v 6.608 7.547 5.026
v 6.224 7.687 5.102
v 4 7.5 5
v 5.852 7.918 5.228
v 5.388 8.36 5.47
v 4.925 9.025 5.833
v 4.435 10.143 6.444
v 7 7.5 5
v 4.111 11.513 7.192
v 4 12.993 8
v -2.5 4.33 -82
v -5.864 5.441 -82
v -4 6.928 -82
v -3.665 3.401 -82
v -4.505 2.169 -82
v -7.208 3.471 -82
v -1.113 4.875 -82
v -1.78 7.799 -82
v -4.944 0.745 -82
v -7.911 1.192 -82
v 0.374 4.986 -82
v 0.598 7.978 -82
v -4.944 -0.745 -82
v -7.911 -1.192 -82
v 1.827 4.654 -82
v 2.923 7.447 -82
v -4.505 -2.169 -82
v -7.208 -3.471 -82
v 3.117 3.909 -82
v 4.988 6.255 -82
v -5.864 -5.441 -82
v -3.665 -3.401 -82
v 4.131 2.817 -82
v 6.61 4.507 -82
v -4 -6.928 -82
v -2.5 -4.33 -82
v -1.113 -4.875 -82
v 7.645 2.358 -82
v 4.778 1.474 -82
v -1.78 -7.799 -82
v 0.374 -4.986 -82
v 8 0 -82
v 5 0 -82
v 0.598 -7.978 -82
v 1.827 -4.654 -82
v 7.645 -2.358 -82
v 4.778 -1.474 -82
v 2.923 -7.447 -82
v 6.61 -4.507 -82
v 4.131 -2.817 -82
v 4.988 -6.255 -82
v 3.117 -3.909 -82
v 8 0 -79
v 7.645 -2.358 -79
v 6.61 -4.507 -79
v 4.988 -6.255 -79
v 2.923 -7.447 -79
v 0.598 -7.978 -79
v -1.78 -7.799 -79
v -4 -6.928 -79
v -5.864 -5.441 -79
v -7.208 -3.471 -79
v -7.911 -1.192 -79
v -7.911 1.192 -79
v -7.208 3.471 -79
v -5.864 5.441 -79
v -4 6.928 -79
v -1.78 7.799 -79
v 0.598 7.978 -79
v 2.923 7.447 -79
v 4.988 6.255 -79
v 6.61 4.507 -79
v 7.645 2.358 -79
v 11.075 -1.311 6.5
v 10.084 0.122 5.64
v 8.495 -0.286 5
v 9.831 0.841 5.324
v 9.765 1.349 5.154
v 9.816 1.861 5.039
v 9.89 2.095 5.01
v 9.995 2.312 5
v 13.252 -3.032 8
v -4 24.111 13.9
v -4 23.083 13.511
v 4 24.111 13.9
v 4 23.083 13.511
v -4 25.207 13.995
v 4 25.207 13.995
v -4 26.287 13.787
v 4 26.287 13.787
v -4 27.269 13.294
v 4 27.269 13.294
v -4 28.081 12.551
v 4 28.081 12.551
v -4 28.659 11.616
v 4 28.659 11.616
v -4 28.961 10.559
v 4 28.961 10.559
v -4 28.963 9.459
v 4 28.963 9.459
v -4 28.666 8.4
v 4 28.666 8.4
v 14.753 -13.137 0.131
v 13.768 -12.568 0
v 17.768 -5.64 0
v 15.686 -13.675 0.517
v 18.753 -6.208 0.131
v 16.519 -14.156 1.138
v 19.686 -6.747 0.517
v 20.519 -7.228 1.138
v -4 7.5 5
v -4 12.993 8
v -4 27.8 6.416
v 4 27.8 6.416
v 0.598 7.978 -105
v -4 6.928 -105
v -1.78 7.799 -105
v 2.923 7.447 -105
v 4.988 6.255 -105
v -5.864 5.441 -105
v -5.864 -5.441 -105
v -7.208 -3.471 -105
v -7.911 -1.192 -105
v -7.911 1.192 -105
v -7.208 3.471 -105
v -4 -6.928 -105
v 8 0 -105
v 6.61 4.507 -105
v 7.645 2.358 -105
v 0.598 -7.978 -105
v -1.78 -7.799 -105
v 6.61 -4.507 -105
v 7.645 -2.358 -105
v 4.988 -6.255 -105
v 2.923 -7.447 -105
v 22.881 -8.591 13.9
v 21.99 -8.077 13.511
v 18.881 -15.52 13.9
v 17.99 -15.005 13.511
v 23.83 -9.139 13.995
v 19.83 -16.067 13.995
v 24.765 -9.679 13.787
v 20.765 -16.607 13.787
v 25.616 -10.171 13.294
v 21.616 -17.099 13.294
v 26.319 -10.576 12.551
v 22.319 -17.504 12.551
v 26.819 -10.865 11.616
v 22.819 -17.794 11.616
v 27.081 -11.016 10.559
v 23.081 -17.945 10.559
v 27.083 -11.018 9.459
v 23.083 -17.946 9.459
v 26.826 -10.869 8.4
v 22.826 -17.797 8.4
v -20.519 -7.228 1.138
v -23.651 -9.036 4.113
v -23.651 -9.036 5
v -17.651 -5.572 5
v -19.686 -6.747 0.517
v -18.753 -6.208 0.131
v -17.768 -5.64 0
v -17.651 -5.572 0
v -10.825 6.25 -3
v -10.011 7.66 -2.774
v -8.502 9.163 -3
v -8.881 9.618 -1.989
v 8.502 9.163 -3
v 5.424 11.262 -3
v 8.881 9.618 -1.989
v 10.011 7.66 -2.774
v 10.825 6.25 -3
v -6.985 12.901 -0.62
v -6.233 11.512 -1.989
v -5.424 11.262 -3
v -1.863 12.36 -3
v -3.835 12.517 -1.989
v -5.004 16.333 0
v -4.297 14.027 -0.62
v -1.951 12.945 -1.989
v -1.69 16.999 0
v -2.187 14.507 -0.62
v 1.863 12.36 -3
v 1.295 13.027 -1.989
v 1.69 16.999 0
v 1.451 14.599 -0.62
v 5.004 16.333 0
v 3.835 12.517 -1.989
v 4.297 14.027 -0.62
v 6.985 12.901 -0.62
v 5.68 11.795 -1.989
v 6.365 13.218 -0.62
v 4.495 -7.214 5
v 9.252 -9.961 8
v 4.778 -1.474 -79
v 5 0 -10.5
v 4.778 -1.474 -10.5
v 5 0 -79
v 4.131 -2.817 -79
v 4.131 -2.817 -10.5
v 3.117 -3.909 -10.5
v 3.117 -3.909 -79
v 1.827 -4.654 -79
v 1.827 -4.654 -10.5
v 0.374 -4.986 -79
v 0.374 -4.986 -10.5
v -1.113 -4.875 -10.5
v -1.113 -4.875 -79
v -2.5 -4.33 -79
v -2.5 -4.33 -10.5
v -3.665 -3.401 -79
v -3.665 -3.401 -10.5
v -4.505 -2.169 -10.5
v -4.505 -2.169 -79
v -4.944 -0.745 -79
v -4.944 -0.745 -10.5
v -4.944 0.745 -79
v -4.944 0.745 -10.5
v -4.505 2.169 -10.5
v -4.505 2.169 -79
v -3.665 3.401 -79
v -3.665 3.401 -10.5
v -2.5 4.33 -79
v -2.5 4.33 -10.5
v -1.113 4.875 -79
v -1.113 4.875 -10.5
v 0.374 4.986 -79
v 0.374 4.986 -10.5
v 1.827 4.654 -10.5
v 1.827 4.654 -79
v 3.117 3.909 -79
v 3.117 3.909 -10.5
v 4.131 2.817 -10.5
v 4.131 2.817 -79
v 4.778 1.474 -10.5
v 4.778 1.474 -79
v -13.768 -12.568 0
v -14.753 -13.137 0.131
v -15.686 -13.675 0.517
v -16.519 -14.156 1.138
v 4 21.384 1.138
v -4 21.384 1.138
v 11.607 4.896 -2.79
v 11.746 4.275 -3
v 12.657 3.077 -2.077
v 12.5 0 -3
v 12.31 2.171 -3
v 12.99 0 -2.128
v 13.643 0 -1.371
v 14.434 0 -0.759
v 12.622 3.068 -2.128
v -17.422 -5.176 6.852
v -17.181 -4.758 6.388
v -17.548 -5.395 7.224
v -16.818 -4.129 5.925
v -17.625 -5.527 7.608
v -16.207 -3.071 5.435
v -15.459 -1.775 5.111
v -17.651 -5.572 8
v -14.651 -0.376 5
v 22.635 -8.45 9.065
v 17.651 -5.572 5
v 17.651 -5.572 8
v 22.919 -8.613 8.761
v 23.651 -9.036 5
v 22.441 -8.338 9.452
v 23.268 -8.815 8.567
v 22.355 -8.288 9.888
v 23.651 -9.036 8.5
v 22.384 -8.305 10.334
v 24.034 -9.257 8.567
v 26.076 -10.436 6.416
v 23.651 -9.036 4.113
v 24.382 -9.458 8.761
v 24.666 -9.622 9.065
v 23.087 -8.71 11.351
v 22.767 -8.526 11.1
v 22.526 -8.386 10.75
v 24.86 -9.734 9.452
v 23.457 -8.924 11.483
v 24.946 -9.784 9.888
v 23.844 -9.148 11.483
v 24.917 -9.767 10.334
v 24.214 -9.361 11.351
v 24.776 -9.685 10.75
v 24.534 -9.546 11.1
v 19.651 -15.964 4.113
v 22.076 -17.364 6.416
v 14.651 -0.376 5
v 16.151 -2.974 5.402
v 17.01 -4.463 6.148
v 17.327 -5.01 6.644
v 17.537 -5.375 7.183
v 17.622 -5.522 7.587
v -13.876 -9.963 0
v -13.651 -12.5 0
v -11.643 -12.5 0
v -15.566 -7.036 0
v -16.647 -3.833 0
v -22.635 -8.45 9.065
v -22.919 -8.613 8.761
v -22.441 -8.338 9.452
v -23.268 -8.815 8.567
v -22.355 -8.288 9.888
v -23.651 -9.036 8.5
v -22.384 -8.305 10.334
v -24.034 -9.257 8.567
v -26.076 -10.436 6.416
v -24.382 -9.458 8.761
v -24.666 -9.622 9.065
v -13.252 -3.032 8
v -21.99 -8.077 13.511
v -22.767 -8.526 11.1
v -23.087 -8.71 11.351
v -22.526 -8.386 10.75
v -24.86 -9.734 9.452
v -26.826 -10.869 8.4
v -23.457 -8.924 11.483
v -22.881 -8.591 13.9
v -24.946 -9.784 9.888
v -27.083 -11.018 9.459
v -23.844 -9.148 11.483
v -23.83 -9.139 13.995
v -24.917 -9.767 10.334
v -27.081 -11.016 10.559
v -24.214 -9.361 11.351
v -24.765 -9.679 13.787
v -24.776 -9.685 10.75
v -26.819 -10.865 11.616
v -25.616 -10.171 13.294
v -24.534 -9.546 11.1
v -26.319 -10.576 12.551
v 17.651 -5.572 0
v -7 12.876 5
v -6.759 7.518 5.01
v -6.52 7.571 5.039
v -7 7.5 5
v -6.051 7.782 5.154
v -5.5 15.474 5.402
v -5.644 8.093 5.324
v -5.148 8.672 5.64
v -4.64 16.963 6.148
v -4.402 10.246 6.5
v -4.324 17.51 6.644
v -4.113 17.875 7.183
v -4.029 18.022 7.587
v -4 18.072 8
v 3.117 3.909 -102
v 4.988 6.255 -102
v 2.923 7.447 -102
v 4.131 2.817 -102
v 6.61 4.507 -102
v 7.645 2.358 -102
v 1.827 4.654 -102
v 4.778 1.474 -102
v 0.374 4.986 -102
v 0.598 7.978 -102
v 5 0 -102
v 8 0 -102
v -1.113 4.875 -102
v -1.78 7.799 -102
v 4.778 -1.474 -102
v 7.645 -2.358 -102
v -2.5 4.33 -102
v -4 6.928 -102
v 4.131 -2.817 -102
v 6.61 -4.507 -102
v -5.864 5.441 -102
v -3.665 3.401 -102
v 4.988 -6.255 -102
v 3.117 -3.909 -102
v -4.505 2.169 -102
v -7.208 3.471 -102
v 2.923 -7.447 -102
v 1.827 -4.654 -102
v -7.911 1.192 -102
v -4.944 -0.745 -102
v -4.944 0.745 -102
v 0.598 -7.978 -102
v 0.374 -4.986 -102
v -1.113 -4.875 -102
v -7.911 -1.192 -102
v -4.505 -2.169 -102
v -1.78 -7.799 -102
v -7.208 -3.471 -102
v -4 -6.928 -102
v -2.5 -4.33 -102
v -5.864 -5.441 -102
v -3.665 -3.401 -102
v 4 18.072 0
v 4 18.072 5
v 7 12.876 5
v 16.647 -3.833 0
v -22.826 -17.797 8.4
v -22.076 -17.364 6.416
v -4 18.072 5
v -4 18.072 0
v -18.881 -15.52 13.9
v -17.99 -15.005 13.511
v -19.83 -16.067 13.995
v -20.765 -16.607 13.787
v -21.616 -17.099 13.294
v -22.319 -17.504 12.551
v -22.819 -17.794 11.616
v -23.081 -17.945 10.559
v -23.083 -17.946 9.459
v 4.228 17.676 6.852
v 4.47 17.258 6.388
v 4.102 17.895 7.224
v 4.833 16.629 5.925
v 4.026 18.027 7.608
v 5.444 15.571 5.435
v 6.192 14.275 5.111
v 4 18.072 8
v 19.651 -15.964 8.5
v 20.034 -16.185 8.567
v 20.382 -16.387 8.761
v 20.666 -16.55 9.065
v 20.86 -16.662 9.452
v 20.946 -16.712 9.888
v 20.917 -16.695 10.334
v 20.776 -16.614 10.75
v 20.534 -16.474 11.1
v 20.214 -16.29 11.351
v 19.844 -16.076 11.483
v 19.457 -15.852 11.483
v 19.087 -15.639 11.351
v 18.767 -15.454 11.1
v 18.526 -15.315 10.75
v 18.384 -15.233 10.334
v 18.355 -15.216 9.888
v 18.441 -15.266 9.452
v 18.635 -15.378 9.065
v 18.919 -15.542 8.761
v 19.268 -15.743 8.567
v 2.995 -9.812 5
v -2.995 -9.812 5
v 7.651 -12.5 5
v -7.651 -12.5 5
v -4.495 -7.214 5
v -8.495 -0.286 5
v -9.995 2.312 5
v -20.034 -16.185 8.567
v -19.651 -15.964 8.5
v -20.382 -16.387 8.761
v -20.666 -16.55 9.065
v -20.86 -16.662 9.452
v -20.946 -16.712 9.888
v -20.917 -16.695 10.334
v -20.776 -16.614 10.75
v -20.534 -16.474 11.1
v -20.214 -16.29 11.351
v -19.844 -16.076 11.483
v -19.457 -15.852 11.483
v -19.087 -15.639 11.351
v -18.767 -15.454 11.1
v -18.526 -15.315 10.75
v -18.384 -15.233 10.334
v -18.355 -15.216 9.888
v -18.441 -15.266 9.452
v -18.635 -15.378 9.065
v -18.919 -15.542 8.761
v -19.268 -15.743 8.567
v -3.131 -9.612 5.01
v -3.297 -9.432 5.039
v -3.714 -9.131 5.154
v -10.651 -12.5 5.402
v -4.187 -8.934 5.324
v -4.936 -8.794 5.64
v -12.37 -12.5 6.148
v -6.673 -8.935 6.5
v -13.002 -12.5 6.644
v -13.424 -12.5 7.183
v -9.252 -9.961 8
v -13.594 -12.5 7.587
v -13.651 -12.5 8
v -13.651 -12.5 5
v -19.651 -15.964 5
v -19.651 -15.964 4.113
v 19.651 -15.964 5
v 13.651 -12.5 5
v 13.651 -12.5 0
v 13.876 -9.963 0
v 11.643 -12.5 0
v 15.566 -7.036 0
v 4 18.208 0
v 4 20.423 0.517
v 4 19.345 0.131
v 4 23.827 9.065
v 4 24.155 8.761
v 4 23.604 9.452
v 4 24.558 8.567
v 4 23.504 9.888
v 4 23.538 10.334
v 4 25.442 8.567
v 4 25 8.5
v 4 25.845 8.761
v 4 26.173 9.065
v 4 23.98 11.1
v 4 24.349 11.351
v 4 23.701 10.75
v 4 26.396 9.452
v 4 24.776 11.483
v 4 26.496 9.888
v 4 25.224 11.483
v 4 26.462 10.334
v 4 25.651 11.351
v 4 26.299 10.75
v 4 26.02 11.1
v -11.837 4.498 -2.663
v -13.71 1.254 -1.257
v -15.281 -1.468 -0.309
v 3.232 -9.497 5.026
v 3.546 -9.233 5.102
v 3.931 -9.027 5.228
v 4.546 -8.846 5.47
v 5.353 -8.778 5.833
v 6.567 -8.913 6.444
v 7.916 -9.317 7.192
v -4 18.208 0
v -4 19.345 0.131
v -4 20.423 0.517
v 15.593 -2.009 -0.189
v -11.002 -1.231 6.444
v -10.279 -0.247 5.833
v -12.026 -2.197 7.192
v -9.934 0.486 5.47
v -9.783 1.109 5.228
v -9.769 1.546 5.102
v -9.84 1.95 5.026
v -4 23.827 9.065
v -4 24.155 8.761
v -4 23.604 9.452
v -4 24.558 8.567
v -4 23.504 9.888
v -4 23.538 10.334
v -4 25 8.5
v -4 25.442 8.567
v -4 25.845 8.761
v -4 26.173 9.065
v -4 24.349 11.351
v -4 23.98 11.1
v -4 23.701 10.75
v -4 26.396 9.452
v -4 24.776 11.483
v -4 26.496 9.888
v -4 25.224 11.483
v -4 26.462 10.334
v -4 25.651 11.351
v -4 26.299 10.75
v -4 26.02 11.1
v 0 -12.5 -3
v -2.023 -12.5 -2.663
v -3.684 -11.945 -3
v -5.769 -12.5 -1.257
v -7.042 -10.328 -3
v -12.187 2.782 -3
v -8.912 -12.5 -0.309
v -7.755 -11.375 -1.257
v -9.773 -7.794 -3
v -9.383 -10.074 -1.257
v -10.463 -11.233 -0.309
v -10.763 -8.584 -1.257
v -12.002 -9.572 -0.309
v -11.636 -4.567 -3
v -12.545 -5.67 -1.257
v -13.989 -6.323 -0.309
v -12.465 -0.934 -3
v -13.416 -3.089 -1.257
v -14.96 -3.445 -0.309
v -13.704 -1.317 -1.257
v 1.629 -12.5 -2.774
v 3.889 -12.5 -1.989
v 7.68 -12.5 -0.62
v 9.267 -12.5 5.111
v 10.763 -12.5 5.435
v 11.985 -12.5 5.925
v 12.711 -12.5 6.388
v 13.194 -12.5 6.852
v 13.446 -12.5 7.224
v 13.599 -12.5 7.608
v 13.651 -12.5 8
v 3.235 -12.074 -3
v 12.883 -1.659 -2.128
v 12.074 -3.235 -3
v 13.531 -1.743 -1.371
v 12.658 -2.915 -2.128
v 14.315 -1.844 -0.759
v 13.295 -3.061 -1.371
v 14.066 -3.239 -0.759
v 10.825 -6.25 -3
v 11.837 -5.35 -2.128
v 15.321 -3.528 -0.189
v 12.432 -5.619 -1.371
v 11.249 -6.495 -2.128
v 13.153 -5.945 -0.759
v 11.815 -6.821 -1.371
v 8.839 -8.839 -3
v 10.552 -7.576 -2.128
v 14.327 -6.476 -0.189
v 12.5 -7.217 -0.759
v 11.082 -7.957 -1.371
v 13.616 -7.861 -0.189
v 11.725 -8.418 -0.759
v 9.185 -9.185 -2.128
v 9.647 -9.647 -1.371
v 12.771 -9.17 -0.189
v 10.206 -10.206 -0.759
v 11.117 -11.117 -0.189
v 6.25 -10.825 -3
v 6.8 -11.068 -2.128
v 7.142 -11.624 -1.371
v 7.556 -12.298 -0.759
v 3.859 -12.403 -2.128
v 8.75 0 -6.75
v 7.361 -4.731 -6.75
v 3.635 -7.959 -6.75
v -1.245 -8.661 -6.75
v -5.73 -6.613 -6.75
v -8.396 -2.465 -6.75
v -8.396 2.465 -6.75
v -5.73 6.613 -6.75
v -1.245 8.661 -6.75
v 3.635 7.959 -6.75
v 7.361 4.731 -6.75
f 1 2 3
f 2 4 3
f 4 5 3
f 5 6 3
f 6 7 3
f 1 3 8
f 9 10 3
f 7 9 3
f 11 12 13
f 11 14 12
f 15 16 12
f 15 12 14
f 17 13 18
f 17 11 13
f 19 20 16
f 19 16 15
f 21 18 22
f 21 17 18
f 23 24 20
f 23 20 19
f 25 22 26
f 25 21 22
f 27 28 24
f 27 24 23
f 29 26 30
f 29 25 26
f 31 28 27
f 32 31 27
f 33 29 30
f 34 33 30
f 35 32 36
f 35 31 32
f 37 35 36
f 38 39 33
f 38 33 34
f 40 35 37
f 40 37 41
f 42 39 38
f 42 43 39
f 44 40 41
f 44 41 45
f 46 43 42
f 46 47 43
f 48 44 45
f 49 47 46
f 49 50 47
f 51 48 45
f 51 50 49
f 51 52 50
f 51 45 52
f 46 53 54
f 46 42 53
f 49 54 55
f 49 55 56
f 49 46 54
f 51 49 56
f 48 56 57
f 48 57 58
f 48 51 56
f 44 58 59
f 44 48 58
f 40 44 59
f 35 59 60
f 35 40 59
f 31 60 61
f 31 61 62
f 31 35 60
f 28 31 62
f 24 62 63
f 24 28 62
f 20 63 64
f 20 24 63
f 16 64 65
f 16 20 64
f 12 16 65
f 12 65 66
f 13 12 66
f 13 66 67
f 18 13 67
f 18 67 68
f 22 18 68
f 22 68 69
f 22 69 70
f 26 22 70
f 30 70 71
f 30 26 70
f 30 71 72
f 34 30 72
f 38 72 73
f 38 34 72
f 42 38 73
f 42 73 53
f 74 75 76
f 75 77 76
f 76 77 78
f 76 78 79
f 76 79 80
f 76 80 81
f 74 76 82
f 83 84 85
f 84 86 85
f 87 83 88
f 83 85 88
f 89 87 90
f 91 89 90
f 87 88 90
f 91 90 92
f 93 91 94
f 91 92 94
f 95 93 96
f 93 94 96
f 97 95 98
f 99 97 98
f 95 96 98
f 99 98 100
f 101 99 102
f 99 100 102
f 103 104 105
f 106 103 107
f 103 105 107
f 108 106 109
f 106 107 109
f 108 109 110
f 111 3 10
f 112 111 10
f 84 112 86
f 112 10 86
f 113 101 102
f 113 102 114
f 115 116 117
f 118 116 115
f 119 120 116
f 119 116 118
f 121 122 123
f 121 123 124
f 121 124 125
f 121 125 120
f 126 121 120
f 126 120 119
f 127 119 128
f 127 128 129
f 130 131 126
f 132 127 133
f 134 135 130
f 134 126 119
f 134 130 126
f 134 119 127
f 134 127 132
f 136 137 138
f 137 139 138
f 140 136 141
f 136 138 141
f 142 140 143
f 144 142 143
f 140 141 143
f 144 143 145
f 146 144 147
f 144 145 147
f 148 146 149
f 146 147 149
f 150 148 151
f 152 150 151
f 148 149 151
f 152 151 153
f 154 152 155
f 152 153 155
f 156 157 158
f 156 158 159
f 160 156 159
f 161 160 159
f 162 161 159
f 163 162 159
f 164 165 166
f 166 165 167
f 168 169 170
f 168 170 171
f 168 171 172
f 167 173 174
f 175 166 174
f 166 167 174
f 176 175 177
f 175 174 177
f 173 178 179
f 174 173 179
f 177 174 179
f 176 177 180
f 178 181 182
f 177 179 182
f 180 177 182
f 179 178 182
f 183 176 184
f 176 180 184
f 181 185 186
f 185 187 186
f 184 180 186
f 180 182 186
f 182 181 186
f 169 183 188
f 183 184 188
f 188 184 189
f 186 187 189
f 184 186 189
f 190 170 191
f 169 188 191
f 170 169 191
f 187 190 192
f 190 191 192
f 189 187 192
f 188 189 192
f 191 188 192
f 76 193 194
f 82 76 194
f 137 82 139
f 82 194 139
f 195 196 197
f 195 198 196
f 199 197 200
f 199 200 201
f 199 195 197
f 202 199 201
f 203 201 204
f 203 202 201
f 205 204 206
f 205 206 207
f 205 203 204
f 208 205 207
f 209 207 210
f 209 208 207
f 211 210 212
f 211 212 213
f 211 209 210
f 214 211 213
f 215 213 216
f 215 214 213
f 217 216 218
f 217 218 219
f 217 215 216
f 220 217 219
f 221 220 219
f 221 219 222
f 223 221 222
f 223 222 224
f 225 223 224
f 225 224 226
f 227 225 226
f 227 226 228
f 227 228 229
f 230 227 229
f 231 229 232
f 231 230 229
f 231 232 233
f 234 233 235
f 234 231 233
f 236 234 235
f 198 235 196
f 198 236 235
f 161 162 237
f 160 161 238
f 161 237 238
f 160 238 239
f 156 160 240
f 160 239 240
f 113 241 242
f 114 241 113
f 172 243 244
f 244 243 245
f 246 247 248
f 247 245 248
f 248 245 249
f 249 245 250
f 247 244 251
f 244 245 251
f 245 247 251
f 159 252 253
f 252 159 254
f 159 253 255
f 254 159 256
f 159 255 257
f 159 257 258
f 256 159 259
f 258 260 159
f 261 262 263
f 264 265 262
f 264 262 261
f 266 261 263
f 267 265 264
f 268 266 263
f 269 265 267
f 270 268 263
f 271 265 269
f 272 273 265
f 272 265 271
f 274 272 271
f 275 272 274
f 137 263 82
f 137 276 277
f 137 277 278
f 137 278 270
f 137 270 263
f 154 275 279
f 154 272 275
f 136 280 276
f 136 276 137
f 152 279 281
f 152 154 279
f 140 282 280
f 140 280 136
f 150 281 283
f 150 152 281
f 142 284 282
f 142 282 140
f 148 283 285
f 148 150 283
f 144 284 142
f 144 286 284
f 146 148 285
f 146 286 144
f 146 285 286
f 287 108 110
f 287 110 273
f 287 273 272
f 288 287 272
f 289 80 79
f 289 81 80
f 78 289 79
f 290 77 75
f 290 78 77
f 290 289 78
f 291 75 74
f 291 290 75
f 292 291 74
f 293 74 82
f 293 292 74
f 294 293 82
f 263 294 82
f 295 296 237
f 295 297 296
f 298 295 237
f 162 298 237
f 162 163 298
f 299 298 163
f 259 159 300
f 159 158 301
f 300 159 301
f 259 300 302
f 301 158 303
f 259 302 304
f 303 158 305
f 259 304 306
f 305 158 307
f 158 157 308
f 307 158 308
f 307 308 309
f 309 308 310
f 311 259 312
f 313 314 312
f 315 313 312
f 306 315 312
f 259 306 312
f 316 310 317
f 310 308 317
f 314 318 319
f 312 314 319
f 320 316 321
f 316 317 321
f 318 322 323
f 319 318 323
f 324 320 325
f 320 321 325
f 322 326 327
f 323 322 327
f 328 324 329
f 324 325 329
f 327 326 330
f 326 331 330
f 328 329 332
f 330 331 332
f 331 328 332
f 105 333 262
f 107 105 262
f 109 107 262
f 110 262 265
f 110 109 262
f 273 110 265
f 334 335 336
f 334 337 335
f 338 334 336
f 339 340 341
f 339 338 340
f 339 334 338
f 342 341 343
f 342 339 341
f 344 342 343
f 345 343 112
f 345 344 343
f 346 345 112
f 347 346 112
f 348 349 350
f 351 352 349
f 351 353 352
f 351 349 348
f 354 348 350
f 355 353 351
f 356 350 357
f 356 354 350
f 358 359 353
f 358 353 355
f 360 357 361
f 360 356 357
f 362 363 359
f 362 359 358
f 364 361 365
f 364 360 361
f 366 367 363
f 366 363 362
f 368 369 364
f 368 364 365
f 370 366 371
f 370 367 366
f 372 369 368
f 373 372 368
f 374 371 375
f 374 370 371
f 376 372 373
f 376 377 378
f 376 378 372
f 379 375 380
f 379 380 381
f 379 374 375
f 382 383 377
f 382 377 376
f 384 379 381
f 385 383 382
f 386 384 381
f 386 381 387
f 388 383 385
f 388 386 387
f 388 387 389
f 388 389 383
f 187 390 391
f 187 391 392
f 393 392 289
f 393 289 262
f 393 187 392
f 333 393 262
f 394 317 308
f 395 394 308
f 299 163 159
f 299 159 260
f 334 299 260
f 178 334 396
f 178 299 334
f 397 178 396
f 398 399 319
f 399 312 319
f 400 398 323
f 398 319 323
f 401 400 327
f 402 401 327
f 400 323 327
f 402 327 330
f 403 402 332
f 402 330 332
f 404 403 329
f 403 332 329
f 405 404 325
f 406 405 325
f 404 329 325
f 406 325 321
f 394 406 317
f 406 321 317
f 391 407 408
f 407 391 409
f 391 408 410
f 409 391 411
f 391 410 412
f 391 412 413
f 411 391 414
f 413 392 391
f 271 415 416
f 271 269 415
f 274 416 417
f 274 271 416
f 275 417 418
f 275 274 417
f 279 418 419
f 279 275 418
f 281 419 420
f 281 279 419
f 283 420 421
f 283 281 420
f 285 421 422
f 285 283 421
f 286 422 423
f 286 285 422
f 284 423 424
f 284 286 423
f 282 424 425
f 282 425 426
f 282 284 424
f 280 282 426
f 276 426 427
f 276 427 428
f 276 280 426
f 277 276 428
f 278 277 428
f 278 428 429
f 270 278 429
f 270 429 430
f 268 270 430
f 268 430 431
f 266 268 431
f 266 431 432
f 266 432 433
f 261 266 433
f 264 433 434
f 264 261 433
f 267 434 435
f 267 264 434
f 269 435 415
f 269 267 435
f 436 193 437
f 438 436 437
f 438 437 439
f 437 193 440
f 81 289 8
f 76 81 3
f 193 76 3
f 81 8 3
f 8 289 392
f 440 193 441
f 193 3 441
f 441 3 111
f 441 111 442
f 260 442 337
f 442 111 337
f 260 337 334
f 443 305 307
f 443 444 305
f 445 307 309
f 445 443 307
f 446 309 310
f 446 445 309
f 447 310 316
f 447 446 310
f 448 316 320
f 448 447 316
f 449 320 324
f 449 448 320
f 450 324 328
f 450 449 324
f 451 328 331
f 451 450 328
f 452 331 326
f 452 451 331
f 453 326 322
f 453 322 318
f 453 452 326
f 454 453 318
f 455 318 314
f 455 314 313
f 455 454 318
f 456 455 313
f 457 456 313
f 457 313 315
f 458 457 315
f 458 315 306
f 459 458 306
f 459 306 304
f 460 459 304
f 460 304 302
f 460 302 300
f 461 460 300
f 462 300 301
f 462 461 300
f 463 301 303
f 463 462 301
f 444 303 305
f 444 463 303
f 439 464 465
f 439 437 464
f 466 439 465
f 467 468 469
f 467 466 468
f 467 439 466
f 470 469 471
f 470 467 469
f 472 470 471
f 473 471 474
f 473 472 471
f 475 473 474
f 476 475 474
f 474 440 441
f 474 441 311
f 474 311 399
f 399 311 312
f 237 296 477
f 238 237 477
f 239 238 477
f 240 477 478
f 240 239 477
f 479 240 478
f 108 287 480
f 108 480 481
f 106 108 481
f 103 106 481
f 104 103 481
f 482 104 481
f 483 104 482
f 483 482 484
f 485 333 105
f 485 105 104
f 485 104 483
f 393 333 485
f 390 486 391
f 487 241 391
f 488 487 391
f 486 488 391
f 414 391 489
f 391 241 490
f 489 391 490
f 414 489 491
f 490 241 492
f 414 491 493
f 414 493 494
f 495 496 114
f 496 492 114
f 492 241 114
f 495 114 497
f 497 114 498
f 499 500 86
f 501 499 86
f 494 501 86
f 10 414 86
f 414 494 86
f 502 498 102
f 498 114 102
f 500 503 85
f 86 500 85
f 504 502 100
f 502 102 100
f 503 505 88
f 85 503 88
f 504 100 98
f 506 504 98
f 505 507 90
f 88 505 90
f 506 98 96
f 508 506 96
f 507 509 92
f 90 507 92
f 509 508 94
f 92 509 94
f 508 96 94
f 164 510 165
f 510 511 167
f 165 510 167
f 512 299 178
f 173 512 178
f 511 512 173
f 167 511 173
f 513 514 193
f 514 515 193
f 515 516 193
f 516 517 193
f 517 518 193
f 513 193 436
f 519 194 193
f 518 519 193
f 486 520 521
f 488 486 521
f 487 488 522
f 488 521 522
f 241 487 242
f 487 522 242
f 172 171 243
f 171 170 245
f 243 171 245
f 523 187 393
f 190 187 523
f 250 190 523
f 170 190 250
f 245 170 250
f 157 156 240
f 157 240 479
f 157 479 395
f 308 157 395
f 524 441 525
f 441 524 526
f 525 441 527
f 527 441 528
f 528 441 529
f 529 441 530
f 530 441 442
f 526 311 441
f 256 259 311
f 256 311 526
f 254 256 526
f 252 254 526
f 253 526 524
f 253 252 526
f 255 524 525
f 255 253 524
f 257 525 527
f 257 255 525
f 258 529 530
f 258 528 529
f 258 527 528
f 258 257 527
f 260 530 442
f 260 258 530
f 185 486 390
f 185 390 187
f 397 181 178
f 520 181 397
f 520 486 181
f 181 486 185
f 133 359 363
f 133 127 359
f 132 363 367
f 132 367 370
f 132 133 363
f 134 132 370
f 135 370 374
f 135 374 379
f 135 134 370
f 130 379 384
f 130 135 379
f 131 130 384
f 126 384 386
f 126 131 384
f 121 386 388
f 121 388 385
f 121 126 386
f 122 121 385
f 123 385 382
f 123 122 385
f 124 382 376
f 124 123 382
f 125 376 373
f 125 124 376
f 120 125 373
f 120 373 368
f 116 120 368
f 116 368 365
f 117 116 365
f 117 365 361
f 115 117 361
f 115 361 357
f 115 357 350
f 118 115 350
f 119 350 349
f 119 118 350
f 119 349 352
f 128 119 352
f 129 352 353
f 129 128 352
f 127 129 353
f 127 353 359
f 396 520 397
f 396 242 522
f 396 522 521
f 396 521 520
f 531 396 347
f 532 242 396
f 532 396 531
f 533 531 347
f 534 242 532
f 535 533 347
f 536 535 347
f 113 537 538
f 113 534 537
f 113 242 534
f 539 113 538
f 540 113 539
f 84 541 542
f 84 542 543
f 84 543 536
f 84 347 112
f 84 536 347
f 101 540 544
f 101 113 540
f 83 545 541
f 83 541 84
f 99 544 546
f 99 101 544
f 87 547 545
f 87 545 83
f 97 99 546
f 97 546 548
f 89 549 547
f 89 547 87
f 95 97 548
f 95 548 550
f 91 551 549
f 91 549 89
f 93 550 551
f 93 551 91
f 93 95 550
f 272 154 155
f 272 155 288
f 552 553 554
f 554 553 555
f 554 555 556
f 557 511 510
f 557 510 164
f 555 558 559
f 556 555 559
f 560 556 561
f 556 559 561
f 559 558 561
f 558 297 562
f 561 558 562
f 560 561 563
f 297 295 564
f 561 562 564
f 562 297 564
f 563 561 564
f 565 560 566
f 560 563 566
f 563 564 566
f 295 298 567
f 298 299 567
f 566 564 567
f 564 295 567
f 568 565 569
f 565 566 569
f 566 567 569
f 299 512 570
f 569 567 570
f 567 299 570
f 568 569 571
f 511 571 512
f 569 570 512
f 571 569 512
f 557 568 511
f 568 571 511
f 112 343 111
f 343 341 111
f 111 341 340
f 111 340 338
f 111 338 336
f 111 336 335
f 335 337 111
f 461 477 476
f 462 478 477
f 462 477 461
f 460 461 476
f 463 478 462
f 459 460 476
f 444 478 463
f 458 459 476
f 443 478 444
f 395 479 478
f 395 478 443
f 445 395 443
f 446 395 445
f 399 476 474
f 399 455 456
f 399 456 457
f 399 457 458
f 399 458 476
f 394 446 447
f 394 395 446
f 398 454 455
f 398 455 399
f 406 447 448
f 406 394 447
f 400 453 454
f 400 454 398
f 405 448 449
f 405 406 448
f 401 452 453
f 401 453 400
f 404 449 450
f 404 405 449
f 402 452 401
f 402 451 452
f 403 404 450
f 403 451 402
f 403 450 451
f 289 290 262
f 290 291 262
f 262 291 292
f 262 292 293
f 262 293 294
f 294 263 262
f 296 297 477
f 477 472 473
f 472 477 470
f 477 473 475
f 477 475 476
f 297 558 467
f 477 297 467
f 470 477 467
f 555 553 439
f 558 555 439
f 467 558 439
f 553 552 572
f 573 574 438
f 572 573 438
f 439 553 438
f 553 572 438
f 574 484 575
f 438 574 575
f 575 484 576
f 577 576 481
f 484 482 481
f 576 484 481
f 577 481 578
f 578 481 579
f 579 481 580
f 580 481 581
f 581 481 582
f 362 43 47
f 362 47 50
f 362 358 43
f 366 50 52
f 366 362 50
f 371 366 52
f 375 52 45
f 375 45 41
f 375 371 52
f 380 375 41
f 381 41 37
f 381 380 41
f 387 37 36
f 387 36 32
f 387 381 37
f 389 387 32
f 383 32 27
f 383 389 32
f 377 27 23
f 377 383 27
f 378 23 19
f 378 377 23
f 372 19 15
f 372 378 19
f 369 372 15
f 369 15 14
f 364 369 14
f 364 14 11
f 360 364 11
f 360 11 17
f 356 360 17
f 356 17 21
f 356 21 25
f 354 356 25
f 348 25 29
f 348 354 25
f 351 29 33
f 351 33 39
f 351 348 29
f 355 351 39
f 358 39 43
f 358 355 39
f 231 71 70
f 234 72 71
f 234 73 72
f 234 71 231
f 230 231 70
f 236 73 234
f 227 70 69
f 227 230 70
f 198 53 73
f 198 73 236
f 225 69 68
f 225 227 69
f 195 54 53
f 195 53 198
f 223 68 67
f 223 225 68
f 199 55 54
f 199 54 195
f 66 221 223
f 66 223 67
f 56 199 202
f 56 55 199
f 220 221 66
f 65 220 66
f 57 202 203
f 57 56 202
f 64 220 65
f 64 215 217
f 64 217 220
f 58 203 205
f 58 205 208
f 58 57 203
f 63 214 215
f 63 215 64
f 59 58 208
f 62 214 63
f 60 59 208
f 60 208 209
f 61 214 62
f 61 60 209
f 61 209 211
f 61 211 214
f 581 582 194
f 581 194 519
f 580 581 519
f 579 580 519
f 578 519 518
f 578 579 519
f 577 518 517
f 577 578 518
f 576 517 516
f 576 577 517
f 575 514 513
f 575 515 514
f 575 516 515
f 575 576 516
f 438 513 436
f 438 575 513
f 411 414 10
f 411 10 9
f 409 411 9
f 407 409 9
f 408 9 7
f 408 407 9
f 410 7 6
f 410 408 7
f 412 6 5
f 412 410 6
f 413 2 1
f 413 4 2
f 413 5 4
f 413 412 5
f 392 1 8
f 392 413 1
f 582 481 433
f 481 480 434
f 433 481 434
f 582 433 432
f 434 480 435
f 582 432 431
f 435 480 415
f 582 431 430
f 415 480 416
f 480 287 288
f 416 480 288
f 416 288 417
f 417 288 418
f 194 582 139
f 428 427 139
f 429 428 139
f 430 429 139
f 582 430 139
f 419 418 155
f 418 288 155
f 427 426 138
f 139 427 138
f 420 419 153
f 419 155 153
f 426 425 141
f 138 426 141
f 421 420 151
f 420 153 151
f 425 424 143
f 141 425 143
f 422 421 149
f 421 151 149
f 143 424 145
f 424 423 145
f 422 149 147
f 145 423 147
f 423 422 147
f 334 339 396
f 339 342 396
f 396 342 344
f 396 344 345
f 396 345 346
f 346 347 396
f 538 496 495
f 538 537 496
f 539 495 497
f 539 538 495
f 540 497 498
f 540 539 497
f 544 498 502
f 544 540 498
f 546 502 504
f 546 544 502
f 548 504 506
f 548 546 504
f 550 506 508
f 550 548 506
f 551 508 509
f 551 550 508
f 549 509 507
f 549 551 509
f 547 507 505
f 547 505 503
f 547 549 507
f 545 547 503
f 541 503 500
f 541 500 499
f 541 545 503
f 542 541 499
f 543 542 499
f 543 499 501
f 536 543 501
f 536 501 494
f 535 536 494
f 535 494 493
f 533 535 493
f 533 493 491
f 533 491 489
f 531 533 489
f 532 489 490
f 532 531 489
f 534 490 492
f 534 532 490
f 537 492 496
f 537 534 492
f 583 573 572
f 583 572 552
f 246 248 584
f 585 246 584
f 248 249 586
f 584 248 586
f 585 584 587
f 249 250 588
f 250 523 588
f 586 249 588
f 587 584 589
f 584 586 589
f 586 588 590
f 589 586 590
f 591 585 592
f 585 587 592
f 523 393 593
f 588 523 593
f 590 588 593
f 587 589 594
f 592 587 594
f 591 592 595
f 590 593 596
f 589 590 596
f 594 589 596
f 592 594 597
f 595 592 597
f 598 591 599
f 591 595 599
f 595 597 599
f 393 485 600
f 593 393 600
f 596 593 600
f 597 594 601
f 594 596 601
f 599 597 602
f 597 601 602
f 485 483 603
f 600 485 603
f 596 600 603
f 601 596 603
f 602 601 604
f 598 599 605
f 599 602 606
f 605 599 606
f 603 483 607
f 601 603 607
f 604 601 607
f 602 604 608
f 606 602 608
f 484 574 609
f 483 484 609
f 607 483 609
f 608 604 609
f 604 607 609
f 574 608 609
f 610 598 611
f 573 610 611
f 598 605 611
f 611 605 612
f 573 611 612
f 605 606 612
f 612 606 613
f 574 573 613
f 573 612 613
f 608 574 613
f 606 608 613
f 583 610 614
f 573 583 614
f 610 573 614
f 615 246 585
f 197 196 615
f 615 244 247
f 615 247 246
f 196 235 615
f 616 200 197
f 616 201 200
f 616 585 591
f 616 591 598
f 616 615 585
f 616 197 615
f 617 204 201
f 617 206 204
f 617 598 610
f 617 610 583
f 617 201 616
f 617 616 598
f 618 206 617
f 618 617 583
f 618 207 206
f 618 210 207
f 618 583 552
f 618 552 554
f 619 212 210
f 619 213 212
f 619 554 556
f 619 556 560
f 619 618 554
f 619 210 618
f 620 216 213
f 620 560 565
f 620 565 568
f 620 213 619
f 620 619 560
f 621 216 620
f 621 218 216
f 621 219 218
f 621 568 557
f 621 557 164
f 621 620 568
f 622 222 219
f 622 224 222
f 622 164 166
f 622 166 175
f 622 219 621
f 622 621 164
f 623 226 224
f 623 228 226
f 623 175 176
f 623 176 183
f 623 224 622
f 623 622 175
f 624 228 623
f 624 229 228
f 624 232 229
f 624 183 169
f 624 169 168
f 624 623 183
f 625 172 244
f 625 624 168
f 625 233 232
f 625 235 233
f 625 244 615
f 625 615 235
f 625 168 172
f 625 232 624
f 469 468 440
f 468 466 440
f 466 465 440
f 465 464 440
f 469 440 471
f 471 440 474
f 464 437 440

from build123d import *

# Parameters (mm, degrees)
EXTRUDE_1_DEPTH          = 5
SKETCH_3_R               = 1.5
EXTRUDE_2_DEPTH          = 4
CUT_EXTRUDE_1_DEPTH      = 112.469065397
PATTERN_CIRCULAR_1_COUNT = 3
FILLET_1_R               = 3
FILLET_2_R               = 5


with BuildPart() as part:
    # 草图1 → 旋转1 (revolve)
    with BuildSketch(Plane(origin=(0, 0, 0), x_dir=(0, 0, -1), z_dir=(1, 0, 0)), mode=Mode.PRIVATE) as revolve_1_sk:
        Polygon((0, 0), (0, 12.5), (3, 12.5), (10.5, 5), (79, 5), (79, 8), (82, 8), (82, 5), (102, 5), (102, 8), (105, 8), (105, 0), align=None)
    revolve(revolve_1_sk.sketch.rotate(Axis((0, 0, 0), (0, 0, -1)), 90), axis=Axis((0, 0, 0), (0, 0, -1)))

    # 草图2 → 凸台-拉伸1 (add)
    with BuildSketch(Plane.XY):
        Polygon((-4, 25), (4, 25), (4, 18.07179677), (17.650635095, -5.57179677), (23.650635095, -9.035898385), (19.650635095, -15.964101615), (13.650635095, -12.5), (-13.650635095, -12.5), (-19.650635095, -15.964101615), (-23.650635095, -9.035898385), (-17.650635095, -5.57179677), (-4, 18.07179677), align=None)
    extrude(amount=EXTRUDE_1_DEPTH)

    # 草图3 → 凸台-拉伸2 (add, symmetric)
    with BuildSketch(Plane(origin=(0, 0, 0), x_dir=(0, 0, -1), z_dir=(1, 0, 0))):
        with BuildLine():
            Line((-5, 7.5), (-13.510549927, 23.082700021))
            ThreePointArc((-13.510549927, 23.082700021), (-12.95059807, 27.700735275), (-8.4, 28.666060556))
            Line((-8.4, 28.666060556), (0, 25))
            Line((0, 25), (-5, 25))
            Line((-5, 25), (-5, 7.5))
        make_face()
        with Locations((-10, 25)):
            Circle(SKETCH_3_R, mode=Mode.SUBTRACT)
    extrude_2 = extrude(amount=EXTRUDE_2_DEPTH, both=True)

    # 草图5 → 切除-拉伸1 (cut, symmetric)
    with BuildSketch(Plane(origin=(0, 0, 0), x_dir=(0, 0, -1), z_dir=(1, 0, 0))):
        Polygon((0, 20), (-6.415605973, 27.8), (0, 25), align=None)
    cut_extrude_1 = extrude(amount=CUT_EXTRUDE_1_DEPTH, both=True, mode=Mode.SUBTRACT)

    # 阵列(圆周)1: 凸台-拉伸2, 切除-拉伸1 ×3 about axis
    pattern_circular_1_axis = Axis((0, 0, 0), (0, 0, 1))
    add([extrude_2.rotate(pattern_circular_1_axis, i * 360 / PATTERN_CIRCULAR_1_COUNT) for i in range(1, PATTERN_CIRCULAR_1_COUNT)])
    add([cut_extrude_1.rotate(pattern_circular_1_axis, i * 360 / PATTERN_CIRCULAR_1_COUNT) for i in range(1, PATTERN_CIRCULAR_1_COUNT)], mode=Mode.SUBTRACT)

    # 圆角1
    # the kernel refuses this fillet: 3 mm, written as the material it adds along each edge
    with BuildSketch(Plane(origin=(20.145825623, -16.25, 5), x_dir=(0, 0, 1), z_dir=(-0.8660254037844384, 0.5000000000000004, 0))) as fillet_1_piece_1_section:
        with BuildLine():
            CenterArc((FILLET_1_R, -FILLET_1_R), FILLET_1_R, 90, 90)
            Line((0, -FILLET_1_R), (0, 0))
            Line((0, 0), (FILLET_1_R, 0))
        make_face()
    fillet_1_piece_1 = extrude(amount=25.57179677, mode=Mode.PRIVATE)
    fillet_1_piece_1 = split(fillet_1_piece_1, bisect_by=Plane(origin=(20.145825623, -12.5, 5), z_dir=(0, 1, 0)), keep=Keep.TOP, mode=Mode.PRIVATE)
    fillet_1_piece_1 = split(fillet_1_piece_1, bisect_by=Plane(origin=(16.550053856, -14.173980202, 12.602327469), z_dir=(0.4151076221534179, -0.23966249739294157, -0.877637481750588)), keep=Keep.TOP, mode=Mode.PRIVATE)
    add(fillet_1_piece_1)
    with BuildSketch(Plane(origin=(24.145825623, -9.32179677, 5), x_dir=(0, 0, 1), z_dir=(-0.8660254037844384, 0.5000000000000004, 0))) as fillet_1_piece_2_section:
        with BuildLine():
            CenterArc((FILLET_1_R, FILLET_1_R), FILLET_1_R, 180, 90)
            Line((0, FILLET_1_R), (0, 0))
            Line((0, 0), (FILLET_1_R, 0))
        make_face()
    fillet_1_piece_2 = extrude(amount=25.57179677, mode=Mode.PRIVATE)
    fillet_1_piece_2 = split(fillet_1_piece_2, bisect_by=Plane(origin=(20.550053856, -7.245776972, 12.602327469), z_dir=(0.4151076221534179, -0.23966249739294157, -0.877637481750588)), keep=Keep.TOP, mode=Mode.PRIVATE)
    fillet_1_piece_2 = split(fillet_1_piece_2, bisect_by=Plane(origin=(20.898230359, -11.19679677, 5), z_dir=(-0.8660254037844386, -0.5000000000000001, 0)), keep=Keep.TOP, mode=Mode.PRIVATE)
    add(fillet_1_piece_2)
    with BuildSketch(Plane(origin=(4, 25.57179677, 5), x_dir=(0, 0, 1), z_dir=(0, -1, 0))) as fillet_1_piece_3_section:
        with BuildLine():
            CenterArc((FILLET_1_R, -FILLET_1_R), FILLET_1_R, 90, 90)
            Line((0, -FILLET_1_R), (0, 0))
            Line((0, 0), (FILLET_1_R, 0))
        make_face()
    fillet_1_piece_3 = extrude(amount=25.57179677, mode=Mode.PRIVATE)
    fillet_1_piece_3 = split(fillet_1_piece_3, bisect_by=Plane(origin=(0.752404736, 23.69679677, 5), z_dir=(-0.8660254037844386, -0.5000000000000001, 0)), keep=Keep.TOP, mode=Mode.PRIVATE)
    fillet_1_piece_3 = split(fillet_1_piece_3, bisect_by=Plane(origin=(4, 21.419757175, 12.602327469), z_dir=(0, 0.4793249947858827, -0.877637481750588)), keep=Keep.TOP, mode=Mode.PRIVATE)
    add(fillet_1_piece_3)
    with BuildSketch(Plane(origin=(-4, 25.57179677, 5), x_dir=(0, 0, 1), z_dir=(0, -1, 0))) as fillet_1_piece_4_section:
        with BuildLine():
            CenterArc((FILLET_1_R, FILLET_1_R), FILLET_1_R, 180, 90)
            Line((0, FILLET_1_R), (0, 0))
            Line((0, 0), (FILLET_1_R, 0))
        make_face()
    fillet_1_piece_4 = extrude(amount=25.57179677, mode=Mode.PRIVATE)
    fillet_1_piece_4 = split(fillet_1_piece_4, bisect_by=Plane(origin=(-0.752404736, 23.69679677, 5), z_dir=(0.8660254037844388, -0.4999999999999999, 0)), keep=Keep.TOP, mode=Mode.PRIVATE)
    fillet_1_piece_4 = split(fillet_1_piece_4, bisect_by=Plane(origin=(-4, 21.419757175, 12.602327469), z_dir=(0, 0.4793249947858827, -0.877637481750588)), keep=Keep.TOP, mode=Mode.PRIVATE)
    add(fillet_1_piece_4)
    with BuildSketch(Plane(origin=(-24.145825623, -9.32179677, 5), x_dir=(0, 0, 1), z_dir=(0.8660254037844388, 0.49999999999999983, 0))) as fillet_1_piece_5_section:
        with BuildLine():
            CenterArc((FILLET_1_R, -FILLET_1_R), FILLET_1_R, 90, 90)
            Line((0, -FILLET_1_R), (0, 0))
            Line((0, 0), (FILLET_1_R, 0))
        make_face()
    fillet_1_piece_5 = extrude(amount=25.57179677, mode=Mode.PRIVATE)
    fillet_1_piece_5 = split(fillet_1_piece_5, bisect_by=Plane(origin=(-20.898230359, -11.19679677, 5), z_dir=(0.8660254037844388, -0.4999999999999999, 0)), keep=Keep.TOP, mode=Mode.PRIVATE)
    fillet_1_piece_5 = split(fillet_1_piece_5, bisect_by=Plane(origin=(-20.550053856, -7.245776972, 12.602327469), z_dir=(-0.4151076221534181, -0.23966249739294126, -0.8776374817505879)), keep=Keep.TOP, mode=Mode.PRIVATE)
    add(fillet_1_piece_5)
    with BuildSketch(Plane(origin=(-20.145825623, -16.25, 5), x_dir=(0, 0, 1), z_dir=(0.8660254037844388, 0.49999999999999983, 0))) as fillet_1_piece_6_section:
        with BuildLine():
            CenterArc((FILLET_1_R, FILLET_1_R), FILLET_1_R, 180, 90)
            Line((0, FILLET_1_R), (0, 0))
            Line((0, 0), (FILLET_1_R, 0))
        make_face()
    fillet_1_piece_6 = extrude(amount=25.57179677, mode=Mode.PRIVATE)
    fillet_1_piece_6 = split(fillet_1_piece_6, bisect_by=Plane(origin=(-20.145825623, -12.5, 5), z_dir=(0, 1, 0)), keep=Keep.TOP, mode=Mode.PRIVATE)
    fillet_1_piece_6 = split(fillet_1_piece_6, bisect_by=Plane(origin=(-16.550053856, -14.173980202, 12.602327469), z_dir=(-0.4151076221534181, -0.23966249739294126, -0.8776374817505879)), keep=Keep.TOP, mode=Mode.PRIVATE)
    add(fillet_1_piece_6)

    # 圆角2
    # the kernel refuses this fillet: 5 mm, written as the material it adds along each edge
    with BuildSketch(Plane(origin=(0, 0, 0), x_dir=(-0.8660253934759007, 0.5000000178549112, 0), z_dir=(-0.5000000178549112, -0.8660253934759007, 0))) as fillet_2_piece_1_section:
        with BuildLine():
            CenterArc((17.082575695, 5), FILLET_2_R, 203.578178478, 66.421821522)
            Line((17.082575695, 0), (12.5, 0))
            Line((12.5, 0), (12.5, 3))
        make_face()
    fillet_2_piece_1 = revolve(axis=Axis((0, 0, 0), (0, 0, -1)), revolution_arc=119.999998782, mode=Mode.PRIVATE)
    fillet_2_piece_1 = split(fillet_2_piece_1, bisect_by=Plane(origin=(-10.825317547, 6.25, 0), z_dir=(0.866025403784329, -0.50000000000019, 0)), keep=Keep.TOP, mode=Mode.PRIVATE)
    fillet_2_piece_1 = split(fillet_2_piece_1, bisect_by=Plane(origin=(10.825317547, 6.25, 0), z_dir=(-0.866025403784329, -0.50000000000019, 0)), keep=Keep.TOP, mode=Mode.PRIVATE)
    add(fillet_2_piece_1)
    with BuildSketch(Plane(origin=(0, 0, 0), x_dir=(3.791753972085742e-09, -1.0, 0), z_dir=(1.0, 3.791753972085742e-09, 0))) as fillet_2_piece_2_section:
        with BuildLine():
            CenterArc((17.082575695, 5), FILLET_2_R, 203.578178478, 66.421821522)
            Line((12.5, 3), (12.5, 0))
            Line((12.5, 0), (17.082575695, 0))
        make_face()
    fillet_2_piece_2 = revolve(axis=Axis((0, 0, 0), (0, 0, -1)), revolution_arc=120.000001399, mode=Mode.PRIVATE)
    fillet_2_piece_2 = split(fillet_2_piece_2, bisect_by=Plane(origin=(-10.825317547, 6.25, 0), z_dir=(0.866025403784329, -0.50000000000019, 0)), keep=Keep.TOP, mode=Mode.PRIVATE)
    fillet_2_piece_2 = split(fillet_2_piece_2, bisect_by=Plane(origin=(0, -12.5, 0), z_dir=(0, 1, 0)), keep=Keep.TOP, mode=Mode.PRIVATE)
    add(fillet_2_piece_2)
    with BuildSketch(Plane(origin=(0, 0, 0), x_dir=(1, 0, 0), z_dir=(0, 1, 0))) as fillet_2_piece_3_section:
        with BuildLine():
            CenterArc((17.082575695, 5), FILLET_2_R, 203.578178478, 66.421821522)
            Line((17.082575695, 0), (12.5, 0))
            Line((12.5, 0), (12.5, 3))
        make_face()
    fillet_2_piece_3 = revolve(axis=Axis((0, 0, 0), (0, 0, -1)), revolution_arc=89.999999783, mode=Mode.PRIVATE)
    fillet_2_piece_3 = split(fillet_2_piece_3, bisect_by=Plane(origin=(10.825317547, 6.25, 0), z_dir=(-0.866025403784329, -0.50000000000019, 0)), keep=Keep.TOP, mode=Mode.PRIVATE)
    fillet_2_piece_3 = split(fillet_2_piece_3, bisect_by=Plane(origin=(0, -12.5, 0), z_dir=(0, 1, 0)), keep=Keep.TOP, mode=Mode.PRIVATE)
    add(fillet_2_piece_3)
    with BuildSketch(Plane(origin=(0, 0, 0), x_dir=(0.8660254034677206, 0.5000000005485719, 0), z_dir=(-0.5000000005485719, 0.8660254034677206, 0))) as fillet_2_piece_4_section:
        with BuildLine():
            CenterArc((17.082575695, 5), FILLET_2_R, 203.578178478, 66.421821522)
            Line((17.082575695, 0), (12.5, 0))
            Line((12.5, 0), (12.5, 3))
        make_face()
    fillet_2_piece_4 = revolve(axis=Axis((0, 0, 0), (0, 0, -1)), revolution_arc=30.000000036, mode=Mode.PRIVATE)
    fillet_2_piece_4 = split(fillet_2_piece_4, bisect_by=Plane(origin=(10.825317547, 6.25, 0), z_dir=(-0.866025403784329, -0.50000000000019, 0)), keep=Keep.TOP, mode=Mode.PRIVATE)
    add(fillet_2_piece_4)
    # the kernel refuses this fillet: 5 mm, written as the material it takes off along each edge
    with BuildSketch(Plane(origin=(-13.080360235, -17.344151491, 0), x_dir=(0.8660254037844387, 0.49999999999999983, 0), z_dir=(-0.49999999999999983, 0.8660254037844388, 0)), Plane(origin=(-8.480295681, 20, 0), x_dir=(0, -1, 0), z_dir=(1, 0, 0))) as fillet_2_2_piece_1:
        with BuildLine():
            CenterArc((FILLET_2_R * 0.358423654455, -FILLET_2_R), FILLET_2_R, 90, 39.437761058)
            Line((-FILLET_2_R * 0.276815994626, -FILLET_2_R * 0.227684916478), (0, 0))
            Line((0, 0), (FILLET_2_R * 0.358423654455, 0))
        make_face()
    extrude(amount=16.960591361, mode=Mode.SUBTRACT)
    with BuildSketch(Plane(origin=(21.560655916, -2.655848509, 0), x_dir=(0.6688444820557844, -0.38615754176090344, 0.6352396490811208), z_dir=(-0.5000000000000004, -0.8660254037844384, 0))) as fillet_2_2_piece_2:
        with BuildLine():
            CenterArc((FILLET_2_R * 0.358423654455, FILLET_2_R), FILLET_2_R, 230.562238942, 39.437761058)
            Line((-FILLET_2_R * 0.276815994626, FILLET_2_R * 0.227684916478), (0, 0))
            Line((0, 0), (FILLET_2_R * 0.358423654455, 0))
        make_face()
    extrude(amount=16.960591361, mode=Mode.SUBTRACT)


solid = part.part
